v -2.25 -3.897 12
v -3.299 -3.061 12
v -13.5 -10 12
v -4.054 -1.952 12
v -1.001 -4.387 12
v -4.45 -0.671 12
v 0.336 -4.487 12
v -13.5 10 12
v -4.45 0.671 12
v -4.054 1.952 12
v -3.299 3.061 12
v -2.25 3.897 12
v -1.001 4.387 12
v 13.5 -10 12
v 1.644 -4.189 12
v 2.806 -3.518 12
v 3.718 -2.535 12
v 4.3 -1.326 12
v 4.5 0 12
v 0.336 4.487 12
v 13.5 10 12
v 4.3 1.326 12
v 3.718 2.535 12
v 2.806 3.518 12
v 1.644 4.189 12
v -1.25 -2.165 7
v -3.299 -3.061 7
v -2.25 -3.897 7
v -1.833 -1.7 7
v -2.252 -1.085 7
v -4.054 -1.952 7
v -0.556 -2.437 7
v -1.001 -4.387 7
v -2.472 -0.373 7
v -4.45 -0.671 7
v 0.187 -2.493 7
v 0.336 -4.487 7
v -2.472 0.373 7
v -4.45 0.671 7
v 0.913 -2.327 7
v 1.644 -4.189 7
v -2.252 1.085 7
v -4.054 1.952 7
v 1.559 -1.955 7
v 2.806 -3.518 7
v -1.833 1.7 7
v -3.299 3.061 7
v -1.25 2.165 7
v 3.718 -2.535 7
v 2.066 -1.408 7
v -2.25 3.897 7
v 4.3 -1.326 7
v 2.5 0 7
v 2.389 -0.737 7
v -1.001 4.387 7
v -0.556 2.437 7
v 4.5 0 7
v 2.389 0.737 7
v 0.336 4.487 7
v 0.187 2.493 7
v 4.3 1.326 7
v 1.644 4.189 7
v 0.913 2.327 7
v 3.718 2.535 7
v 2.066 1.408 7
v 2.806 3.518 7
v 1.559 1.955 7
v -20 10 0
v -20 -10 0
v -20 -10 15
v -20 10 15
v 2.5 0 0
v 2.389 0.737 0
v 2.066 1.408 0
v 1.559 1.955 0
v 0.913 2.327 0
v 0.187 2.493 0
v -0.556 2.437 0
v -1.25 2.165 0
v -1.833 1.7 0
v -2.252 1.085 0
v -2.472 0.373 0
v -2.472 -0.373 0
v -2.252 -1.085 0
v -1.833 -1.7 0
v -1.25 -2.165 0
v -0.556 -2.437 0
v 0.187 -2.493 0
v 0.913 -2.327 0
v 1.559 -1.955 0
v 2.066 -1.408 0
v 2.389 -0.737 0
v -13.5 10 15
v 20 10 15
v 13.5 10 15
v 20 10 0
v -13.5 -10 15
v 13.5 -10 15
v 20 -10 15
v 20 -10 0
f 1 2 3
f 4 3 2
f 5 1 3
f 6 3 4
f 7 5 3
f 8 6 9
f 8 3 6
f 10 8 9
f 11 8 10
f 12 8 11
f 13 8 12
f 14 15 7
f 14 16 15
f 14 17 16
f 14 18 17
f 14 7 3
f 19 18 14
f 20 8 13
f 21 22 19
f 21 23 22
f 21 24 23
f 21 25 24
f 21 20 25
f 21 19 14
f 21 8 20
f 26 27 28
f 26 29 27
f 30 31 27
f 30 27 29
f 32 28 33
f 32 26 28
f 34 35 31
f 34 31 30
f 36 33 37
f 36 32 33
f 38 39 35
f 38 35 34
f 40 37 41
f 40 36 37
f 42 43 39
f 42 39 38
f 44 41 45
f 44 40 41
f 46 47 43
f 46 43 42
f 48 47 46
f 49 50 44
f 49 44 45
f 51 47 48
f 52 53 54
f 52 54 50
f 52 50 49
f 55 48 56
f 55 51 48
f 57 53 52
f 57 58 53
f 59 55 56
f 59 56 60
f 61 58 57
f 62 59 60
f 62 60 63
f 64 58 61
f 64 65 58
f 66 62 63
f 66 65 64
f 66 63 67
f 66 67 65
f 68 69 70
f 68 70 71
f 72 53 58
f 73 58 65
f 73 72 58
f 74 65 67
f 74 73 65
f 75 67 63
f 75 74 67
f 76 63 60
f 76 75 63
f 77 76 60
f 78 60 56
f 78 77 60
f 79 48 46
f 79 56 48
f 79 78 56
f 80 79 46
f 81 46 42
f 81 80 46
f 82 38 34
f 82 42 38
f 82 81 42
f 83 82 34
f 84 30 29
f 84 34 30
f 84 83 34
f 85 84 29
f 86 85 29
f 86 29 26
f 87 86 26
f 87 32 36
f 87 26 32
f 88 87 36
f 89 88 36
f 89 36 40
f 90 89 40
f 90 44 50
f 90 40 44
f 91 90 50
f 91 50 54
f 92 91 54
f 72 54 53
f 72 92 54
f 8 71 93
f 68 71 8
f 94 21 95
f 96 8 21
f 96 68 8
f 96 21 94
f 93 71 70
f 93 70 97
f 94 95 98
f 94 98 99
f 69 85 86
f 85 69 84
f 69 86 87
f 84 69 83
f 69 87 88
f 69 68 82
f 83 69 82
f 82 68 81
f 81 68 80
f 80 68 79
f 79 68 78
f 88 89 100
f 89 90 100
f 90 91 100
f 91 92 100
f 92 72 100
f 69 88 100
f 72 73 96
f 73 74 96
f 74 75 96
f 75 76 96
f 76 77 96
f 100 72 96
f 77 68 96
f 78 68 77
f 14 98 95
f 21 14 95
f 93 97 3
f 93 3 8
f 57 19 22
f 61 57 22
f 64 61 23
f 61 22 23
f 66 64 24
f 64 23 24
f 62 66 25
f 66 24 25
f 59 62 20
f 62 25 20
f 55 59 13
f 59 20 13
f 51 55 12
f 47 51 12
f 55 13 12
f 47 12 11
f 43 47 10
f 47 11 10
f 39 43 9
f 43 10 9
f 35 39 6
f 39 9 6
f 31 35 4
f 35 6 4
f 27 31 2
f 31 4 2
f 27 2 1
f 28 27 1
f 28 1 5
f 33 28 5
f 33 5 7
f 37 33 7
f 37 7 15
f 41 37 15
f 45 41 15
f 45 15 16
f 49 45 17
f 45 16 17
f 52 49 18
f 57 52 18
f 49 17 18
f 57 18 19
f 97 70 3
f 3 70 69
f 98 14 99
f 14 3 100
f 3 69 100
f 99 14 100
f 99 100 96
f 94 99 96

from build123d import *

# Parameters (mm, degrees)
F0_W     = 40
F0_H     = 20
F0_R     = 2.5
F1_DEPTH = 15
F2_W     = 27
F2_H     = 20
F2_R     = 2.5
F3_DEPTH = 3
F4_R     = 4.5
F5_DEPTH = 5


with BuildPart() as f1:
    # F0 (on Top) → F1 (new body)
    with BuildSketch(Plane.XY):
        Rectangle(F0_W, F0_H)
        Circle(F0_R, mode=Mode.SUBTRACT)
    extrude(amount=F1_DEPTH)

    # F2 (on face) → F3 (cut)
    with BuildSketch(Plane.XY.offset(15)):
        Rectangle(F2_W, F2_H)
        Circle(F2_R, mode=Mode.SUBTRACT)
    extrude(amount=-F3_DEPTH, mode=Mode.SUBTRACT)

    # F4 (on face) → F5 (cut)
    with BuildSketch(Plane.XY.offset(12)):
        Circle(F4_R)
    extrude(amount=-F5_DEPTH, mode=Mode.SUBTRACT)


solid = f1.part
